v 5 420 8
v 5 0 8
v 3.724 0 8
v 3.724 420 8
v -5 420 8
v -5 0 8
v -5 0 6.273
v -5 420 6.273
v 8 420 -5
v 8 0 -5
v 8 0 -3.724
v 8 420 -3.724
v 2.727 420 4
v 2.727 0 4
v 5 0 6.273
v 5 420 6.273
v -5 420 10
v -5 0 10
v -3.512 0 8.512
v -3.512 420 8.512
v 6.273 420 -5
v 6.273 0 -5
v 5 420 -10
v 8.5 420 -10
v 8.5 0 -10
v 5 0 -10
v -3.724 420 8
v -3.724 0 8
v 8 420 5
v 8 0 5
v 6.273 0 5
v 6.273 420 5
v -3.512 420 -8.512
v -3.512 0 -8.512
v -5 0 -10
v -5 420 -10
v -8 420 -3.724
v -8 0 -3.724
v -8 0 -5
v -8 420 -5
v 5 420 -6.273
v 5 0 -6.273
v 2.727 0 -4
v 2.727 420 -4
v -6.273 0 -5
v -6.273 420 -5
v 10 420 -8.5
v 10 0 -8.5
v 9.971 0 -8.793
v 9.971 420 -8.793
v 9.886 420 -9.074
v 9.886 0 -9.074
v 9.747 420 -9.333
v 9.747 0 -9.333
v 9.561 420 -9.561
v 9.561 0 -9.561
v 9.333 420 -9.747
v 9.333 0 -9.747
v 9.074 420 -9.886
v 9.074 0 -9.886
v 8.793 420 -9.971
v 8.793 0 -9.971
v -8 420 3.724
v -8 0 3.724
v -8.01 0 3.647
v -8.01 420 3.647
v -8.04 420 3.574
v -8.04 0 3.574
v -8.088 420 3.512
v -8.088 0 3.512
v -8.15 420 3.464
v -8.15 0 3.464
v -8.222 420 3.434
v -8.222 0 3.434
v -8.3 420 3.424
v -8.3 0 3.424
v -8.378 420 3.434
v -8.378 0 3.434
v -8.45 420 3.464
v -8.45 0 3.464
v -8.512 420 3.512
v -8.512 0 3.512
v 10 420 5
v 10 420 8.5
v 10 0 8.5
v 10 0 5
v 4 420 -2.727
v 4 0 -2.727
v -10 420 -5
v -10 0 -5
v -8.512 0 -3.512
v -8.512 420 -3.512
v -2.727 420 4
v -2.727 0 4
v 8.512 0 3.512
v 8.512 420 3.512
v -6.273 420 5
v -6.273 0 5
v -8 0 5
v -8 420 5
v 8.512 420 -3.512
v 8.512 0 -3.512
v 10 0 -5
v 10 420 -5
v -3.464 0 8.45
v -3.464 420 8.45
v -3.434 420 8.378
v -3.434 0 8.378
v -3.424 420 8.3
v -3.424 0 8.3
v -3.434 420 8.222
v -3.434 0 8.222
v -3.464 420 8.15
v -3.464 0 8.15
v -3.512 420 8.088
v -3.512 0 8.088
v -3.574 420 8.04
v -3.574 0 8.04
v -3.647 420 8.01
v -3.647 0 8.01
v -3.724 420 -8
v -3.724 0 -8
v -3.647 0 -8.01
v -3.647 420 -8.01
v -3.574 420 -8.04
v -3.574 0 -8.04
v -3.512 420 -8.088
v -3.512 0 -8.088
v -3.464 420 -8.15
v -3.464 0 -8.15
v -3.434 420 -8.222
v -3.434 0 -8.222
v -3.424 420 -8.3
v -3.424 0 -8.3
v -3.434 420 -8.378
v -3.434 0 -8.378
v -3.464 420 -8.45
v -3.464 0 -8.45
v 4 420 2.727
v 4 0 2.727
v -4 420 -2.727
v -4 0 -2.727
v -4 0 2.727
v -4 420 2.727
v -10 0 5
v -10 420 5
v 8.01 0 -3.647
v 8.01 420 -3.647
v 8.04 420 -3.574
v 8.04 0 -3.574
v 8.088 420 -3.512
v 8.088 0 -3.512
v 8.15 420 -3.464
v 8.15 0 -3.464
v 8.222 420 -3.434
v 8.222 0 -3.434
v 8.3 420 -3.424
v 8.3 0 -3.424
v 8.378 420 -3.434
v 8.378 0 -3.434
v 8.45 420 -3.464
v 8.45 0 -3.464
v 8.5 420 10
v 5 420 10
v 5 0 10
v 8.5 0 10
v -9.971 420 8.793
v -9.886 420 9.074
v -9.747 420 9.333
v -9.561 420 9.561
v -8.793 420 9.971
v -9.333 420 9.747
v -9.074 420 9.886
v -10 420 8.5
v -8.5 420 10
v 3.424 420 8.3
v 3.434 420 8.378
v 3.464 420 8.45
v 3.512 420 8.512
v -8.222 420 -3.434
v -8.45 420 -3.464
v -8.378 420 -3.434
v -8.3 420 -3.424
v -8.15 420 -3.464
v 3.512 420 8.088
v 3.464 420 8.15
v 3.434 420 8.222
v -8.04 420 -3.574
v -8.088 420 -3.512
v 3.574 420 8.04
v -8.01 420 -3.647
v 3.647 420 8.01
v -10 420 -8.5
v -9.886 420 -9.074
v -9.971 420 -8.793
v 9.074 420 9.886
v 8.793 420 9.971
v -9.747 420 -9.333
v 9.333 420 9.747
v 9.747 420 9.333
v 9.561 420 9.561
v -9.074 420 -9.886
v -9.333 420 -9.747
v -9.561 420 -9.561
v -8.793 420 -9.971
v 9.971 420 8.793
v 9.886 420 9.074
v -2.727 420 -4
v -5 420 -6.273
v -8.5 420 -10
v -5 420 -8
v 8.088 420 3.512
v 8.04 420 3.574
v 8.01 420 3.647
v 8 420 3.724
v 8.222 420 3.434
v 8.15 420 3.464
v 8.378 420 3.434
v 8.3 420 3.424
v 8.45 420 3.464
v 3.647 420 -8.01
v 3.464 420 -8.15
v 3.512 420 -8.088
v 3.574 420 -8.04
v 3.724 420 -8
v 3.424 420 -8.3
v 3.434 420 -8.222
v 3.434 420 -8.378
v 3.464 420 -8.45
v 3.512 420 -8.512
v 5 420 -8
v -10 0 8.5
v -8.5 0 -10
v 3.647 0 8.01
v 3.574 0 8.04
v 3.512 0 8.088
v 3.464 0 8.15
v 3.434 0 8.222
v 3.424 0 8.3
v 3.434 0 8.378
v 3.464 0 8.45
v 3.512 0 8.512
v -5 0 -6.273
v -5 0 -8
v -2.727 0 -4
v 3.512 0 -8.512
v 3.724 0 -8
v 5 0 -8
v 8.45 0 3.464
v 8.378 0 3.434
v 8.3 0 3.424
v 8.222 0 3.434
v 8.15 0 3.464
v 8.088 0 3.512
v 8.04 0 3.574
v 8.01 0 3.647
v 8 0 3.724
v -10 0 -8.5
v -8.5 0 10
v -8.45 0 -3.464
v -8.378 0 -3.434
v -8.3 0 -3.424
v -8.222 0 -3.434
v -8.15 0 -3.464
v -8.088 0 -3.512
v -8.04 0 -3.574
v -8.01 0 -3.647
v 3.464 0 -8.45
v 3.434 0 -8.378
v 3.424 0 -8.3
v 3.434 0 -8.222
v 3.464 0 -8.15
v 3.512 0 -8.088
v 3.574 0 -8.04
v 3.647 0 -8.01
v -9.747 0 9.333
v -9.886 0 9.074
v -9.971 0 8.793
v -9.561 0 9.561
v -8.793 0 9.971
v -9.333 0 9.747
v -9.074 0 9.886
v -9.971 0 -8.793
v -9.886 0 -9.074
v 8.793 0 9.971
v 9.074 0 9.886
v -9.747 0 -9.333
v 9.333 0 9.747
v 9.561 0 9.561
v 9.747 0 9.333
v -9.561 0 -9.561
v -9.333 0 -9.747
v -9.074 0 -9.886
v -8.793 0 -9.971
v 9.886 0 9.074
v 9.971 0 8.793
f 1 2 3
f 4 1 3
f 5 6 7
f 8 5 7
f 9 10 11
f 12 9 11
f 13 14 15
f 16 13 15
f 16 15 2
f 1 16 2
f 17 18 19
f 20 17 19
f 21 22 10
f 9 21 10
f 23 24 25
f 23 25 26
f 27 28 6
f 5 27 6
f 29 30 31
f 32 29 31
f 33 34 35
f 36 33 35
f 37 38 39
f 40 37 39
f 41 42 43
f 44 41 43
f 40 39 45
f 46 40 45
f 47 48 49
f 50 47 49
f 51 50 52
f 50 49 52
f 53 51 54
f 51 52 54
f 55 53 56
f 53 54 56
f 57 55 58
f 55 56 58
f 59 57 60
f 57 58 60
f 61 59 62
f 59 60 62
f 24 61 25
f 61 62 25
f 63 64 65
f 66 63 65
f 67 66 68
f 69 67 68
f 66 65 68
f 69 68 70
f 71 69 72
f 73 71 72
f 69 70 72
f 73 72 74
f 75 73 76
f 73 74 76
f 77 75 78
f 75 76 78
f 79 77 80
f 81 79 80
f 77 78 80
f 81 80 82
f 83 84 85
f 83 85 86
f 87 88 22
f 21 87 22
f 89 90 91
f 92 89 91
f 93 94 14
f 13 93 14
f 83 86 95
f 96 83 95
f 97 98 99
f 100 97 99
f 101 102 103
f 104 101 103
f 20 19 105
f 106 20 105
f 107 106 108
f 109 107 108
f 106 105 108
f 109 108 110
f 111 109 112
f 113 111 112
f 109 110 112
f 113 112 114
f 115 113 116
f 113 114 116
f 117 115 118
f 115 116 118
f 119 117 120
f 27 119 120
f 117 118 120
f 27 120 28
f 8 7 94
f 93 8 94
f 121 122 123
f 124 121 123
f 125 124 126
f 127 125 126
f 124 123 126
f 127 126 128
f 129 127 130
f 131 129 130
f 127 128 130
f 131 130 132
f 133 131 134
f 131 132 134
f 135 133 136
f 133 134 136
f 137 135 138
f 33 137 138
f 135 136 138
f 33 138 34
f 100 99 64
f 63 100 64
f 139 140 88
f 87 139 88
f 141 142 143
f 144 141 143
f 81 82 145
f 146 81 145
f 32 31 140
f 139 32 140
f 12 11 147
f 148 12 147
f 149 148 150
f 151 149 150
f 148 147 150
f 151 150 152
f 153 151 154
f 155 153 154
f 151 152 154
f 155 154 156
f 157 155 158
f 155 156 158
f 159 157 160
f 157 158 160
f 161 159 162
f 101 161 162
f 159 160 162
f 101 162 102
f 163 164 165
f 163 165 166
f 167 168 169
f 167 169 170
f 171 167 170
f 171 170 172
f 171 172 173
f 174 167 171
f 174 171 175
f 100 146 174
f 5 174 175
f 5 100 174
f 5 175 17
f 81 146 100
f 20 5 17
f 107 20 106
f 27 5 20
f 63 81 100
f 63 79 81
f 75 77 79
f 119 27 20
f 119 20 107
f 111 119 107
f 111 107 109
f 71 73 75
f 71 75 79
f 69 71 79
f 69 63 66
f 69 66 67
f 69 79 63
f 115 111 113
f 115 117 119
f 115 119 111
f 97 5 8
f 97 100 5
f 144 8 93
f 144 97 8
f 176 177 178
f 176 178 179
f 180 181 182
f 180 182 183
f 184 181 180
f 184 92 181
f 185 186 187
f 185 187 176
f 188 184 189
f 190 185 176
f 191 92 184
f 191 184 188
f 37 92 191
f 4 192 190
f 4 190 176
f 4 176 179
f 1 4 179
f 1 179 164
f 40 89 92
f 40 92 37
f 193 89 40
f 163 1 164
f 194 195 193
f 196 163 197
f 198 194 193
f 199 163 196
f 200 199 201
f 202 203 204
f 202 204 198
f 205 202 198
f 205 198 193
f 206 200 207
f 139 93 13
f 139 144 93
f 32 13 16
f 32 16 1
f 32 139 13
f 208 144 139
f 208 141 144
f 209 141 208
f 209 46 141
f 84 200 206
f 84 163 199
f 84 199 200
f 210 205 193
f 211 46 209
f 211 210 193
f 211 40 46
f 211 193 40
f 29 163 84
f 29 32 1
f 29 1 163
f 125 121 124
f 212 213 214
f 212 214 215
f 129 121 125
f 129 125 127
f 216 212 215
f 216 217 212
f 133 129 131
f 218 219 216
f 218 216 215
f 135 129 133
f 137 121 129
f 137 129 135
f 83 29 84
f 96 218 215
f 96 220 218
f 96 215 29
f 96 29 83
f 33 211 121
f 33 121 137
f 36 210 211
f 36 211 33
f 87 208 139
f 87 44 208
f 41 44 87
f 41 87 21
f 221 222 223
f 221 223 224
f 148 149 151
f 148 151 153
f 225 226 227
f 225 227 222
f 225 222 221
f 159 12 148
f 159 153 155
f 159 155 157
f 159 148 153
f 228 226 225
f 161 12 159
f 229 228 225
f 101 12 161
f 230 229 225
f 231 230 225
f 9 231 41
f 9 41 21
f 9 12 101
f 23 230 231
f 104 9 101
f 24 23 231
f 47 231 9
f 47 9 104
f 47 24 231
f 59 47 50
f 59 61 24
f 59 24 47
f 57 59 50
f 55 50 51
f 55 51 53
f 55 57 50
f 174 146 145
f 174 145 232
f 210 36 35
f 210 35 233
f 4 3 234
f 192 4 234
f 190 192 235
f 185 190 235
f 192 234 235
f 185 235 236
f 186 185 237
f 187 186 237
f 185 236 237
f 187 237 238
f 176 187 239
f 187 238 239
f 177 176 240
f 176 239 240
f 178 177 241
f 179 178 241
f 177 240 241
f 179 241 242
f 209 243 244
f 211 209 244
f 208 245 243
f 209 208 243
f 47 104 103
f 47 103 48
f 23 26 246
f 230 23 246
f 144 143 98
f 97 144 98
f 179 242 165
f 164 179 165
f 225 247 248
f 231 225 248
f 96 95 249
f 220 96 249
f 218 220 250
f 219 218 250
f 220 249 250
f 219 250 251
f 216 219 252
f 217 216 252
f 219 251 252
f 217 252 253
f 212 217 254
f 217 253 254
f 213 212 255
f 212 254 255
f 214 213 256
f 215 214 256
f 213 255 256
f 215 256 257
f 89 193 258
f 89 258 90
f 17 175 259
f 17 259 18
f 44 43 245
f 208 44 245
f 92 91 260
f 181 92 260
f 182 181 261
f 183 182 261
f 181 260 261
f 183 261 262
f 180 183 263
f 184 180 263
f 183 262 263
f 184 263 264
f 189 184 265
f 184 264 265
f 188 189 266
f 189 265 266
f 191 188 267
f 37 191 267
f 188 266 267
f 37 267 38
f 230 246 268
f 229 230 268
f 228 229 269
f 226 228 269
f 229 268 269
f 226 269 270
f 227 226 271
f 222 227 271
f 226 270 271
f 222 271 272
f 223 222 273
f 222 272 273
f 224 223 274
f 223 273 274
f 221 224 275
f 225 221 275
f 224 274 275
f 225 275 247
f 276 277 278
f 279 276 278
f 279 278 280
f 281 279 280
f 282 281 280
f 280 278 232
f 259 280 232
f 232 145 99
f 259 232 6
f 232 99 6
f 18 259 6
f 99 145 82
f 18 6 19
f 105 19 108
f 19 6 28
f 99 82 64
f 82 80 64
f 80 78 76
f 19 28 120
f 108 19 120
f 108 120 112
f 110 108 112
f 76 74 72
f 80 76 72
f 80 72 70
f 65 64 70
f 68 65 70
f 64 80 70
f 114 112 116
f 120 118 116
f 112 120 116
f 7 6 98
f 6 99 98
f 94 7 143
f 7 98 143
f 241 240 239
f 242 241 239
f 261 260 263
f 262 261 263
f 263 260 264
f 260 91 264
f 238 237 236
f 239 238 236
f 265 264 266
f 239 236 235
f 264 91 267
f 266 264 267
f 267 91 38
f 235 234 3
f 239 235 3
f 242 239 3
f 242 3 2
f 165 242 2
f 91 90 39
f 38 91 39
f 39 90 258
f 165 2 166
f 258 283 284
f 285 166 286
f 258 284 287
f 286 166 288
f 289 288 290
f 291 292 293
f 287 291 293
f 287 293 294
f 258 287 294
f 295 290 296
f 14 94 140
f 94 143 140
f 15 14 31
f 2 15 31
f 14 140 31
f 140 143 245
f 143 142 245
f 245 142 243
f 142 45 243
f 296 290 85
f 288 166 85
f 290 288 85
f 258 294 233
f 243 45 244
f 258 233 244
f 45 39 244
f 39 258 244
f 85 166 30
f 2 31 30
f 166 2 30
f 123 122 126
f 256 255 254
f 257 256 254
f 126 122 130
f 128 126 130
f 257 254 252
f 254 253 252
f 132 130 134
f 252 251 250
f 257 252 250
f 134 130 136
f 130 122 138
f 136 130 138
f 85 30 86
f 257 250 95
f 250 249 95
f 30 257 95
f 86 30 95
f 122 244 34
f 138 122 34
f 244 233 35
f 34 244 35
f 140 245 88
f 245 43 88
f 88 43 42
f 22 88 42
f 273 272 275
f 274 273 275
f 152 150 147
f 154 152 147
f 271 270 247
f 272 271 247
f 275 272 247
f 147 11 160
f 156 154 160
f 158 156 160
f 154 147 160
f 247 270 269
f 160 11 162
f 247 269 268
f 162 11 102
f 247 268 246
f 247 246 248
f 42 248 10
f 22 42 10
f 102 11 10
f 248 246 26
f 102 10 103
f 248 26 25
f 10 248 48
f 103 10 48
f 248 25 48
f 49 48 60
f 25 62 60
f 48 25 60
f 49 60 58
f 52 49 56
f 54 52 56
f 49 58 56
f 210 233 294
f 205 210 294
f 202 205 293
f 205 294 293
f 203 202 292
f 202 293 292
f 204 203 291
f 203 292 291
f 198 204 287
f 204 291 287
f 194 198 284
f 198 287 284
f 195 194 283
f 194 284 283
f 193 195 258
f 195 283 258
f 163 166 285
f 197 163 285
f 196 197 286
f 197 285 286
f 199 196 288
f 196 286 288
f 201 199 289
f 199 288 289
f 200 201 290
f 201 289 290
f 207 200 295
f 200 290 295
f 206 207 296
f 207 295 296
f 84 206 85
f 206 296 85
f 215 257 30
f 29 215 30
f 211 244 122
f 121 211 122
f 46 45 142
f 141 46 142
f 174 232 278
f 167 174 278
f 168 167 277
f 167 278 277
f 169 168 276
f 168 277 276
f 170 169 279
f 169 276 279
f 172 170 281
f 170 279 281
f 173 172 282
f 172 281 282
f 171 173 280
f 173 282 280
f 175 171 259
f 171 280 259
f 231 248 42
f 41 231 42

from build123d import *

# Parameters (mm, degrees)
EXTRUDE_1_DEPTH = 420


with BuildPart() as part:
    # Эскиз1 → Бобышка-Вытянуть1 (new body)
    with BuildSketch(Plane(origin=(0, 0, 0), x_dir=(1, 0, 0), z_dir=(0, 1, 0))):
        with BuildLine():
            Line((6.272792206, 5), (8, 5))
            Line((8, 5), (8, 3.724264069))
            ThreePointArc((8, 3.724264069), (8.18519497, 3.447100209), (8.512132034, 3.512132034))
            Line((8.512132034, 3.512132034), (10, 5))
            Line((10, 5), (10, 8.5))
            ThreePointArc((10, 8.5), (9.560660172, 9.560660172), (8.5, 10))
            Line((8.5, 10), (5, 10))
            Line((5, 10), (3.512132034, 8.512132034))
            ThreePointArc((3.512132034, 8.512132034), (3.447100209, 8.18519497), (3.724264069, 8))
            Line((3.724264069, 8), (5, 8))
            Line((5, 8), (5, 6.272792206))
            Line((5, 6.272792206), (2.727207794, 4))
            Line((2.727207794, 4), (-2.727207794, 4))
            Line((-2.727207794, 4), (-5, 6.272792206))
            Line((-5, 6.272792206), (-5, 8))
            Line((-5, 8), (-3.724264069, 8))
            ThreePointArc((-3.724264069, 8), (-3.447100209, 8.18519497), (-3.512132034, 8.512132034))
            Line((-3.512132034, 8.512132034), (-5, 10))
            Line((-5, 10), (-8.5, 10))
            ThreePointArc((-8.5, 10), (-9.560660172, 9.560660172), (-10, 8.5))
            Line((-10, 8.5), (-10, 5))
            Line((-10, 5), (-8.512132034, 3.512132034))
            ThreePointArc((-8.512132034, 3.512132034), (-8.18519497, 3.447100209), (-8, 3.724264069))
            Line((-8, 3.724264069), (-8, 5))
            Line((-8, 5), (-6.272792206, 5))
            Line((-6.272792206, 5), (-4, 2.727207794))
            Line((-4, 2.727207794), (-4, -2.727207794))
            Line((-4, -2.727207794), (-6.272792206, -5))
            Line((-6.272792206, -5), (-8, -5))
            Line((-8, -5), (-8, -3.724264069))
            ThreePointArc((-8, -3.724264069), (-8.18519497, -3.447100209), (-8.512132034, -3.512132034))
            Line((-8.512132034, -3.512132034), (-10, -5))
            Line((-10, -5), (-10, -8.5))
            ThreePointArc((-10, -8.5), (-9.560660172, -9.560660172), (-8.5, -10))
            Line((-8.5, -10), (-5, -10))
            Line((-5, -10), (-3.512132034, -8.512132034))
            ThreePointArc((-3.512132034, -8.512132034), (-3.447100209, -8.18519497), (-3.724264069, -8))
            Line((-3.724264069, -8), (-5, -8))
            Line((-5, -8), (-5, -6.272792206))
            Line((-5, -6.272792206), (-2.727207794, -4))
            Line((-2.727207794, -4), (2.727207794, -4))
            Line((2.727207794, -4), (5, -6.272792206))
            Line((5, -6.272792206), (5, -8))
            Line((5, -8), (3.724264069, -8))
            ThreePointArc((3.724264069, -8), (3.447100209, -8.18519497), (3.512132034, -8.512132034))
            Line((3.512132034, -8.512132034), (5, -10))
            Line((5, -10), (8.5, -10))
            ThreePointArc((8.5, -10), (9.560660172, -9.560660172), (10, -8.5))
            Line((10, -8.5), (10, -5))
            Line((10, -5), (8.512132034, -3.512132034))
            ThreePointArc((8.512132034, -3.512132034), (8.18519497, -3.447100209), (8, -3.724264069))
            Line((8, -3.724264069), (8, -5))
            Line((8, -5), (6.272792206, -5))
            Line((6.272792206, -5), (4, -2.727207794))
            Line((4, -2.727207794), (4, 2.727207794))
            Line((4, 2.727207794), (6.272792206, 5))
        make_face()
    extrude(amount=EXTRUDE_1_DEPTH)


solid = part.part
